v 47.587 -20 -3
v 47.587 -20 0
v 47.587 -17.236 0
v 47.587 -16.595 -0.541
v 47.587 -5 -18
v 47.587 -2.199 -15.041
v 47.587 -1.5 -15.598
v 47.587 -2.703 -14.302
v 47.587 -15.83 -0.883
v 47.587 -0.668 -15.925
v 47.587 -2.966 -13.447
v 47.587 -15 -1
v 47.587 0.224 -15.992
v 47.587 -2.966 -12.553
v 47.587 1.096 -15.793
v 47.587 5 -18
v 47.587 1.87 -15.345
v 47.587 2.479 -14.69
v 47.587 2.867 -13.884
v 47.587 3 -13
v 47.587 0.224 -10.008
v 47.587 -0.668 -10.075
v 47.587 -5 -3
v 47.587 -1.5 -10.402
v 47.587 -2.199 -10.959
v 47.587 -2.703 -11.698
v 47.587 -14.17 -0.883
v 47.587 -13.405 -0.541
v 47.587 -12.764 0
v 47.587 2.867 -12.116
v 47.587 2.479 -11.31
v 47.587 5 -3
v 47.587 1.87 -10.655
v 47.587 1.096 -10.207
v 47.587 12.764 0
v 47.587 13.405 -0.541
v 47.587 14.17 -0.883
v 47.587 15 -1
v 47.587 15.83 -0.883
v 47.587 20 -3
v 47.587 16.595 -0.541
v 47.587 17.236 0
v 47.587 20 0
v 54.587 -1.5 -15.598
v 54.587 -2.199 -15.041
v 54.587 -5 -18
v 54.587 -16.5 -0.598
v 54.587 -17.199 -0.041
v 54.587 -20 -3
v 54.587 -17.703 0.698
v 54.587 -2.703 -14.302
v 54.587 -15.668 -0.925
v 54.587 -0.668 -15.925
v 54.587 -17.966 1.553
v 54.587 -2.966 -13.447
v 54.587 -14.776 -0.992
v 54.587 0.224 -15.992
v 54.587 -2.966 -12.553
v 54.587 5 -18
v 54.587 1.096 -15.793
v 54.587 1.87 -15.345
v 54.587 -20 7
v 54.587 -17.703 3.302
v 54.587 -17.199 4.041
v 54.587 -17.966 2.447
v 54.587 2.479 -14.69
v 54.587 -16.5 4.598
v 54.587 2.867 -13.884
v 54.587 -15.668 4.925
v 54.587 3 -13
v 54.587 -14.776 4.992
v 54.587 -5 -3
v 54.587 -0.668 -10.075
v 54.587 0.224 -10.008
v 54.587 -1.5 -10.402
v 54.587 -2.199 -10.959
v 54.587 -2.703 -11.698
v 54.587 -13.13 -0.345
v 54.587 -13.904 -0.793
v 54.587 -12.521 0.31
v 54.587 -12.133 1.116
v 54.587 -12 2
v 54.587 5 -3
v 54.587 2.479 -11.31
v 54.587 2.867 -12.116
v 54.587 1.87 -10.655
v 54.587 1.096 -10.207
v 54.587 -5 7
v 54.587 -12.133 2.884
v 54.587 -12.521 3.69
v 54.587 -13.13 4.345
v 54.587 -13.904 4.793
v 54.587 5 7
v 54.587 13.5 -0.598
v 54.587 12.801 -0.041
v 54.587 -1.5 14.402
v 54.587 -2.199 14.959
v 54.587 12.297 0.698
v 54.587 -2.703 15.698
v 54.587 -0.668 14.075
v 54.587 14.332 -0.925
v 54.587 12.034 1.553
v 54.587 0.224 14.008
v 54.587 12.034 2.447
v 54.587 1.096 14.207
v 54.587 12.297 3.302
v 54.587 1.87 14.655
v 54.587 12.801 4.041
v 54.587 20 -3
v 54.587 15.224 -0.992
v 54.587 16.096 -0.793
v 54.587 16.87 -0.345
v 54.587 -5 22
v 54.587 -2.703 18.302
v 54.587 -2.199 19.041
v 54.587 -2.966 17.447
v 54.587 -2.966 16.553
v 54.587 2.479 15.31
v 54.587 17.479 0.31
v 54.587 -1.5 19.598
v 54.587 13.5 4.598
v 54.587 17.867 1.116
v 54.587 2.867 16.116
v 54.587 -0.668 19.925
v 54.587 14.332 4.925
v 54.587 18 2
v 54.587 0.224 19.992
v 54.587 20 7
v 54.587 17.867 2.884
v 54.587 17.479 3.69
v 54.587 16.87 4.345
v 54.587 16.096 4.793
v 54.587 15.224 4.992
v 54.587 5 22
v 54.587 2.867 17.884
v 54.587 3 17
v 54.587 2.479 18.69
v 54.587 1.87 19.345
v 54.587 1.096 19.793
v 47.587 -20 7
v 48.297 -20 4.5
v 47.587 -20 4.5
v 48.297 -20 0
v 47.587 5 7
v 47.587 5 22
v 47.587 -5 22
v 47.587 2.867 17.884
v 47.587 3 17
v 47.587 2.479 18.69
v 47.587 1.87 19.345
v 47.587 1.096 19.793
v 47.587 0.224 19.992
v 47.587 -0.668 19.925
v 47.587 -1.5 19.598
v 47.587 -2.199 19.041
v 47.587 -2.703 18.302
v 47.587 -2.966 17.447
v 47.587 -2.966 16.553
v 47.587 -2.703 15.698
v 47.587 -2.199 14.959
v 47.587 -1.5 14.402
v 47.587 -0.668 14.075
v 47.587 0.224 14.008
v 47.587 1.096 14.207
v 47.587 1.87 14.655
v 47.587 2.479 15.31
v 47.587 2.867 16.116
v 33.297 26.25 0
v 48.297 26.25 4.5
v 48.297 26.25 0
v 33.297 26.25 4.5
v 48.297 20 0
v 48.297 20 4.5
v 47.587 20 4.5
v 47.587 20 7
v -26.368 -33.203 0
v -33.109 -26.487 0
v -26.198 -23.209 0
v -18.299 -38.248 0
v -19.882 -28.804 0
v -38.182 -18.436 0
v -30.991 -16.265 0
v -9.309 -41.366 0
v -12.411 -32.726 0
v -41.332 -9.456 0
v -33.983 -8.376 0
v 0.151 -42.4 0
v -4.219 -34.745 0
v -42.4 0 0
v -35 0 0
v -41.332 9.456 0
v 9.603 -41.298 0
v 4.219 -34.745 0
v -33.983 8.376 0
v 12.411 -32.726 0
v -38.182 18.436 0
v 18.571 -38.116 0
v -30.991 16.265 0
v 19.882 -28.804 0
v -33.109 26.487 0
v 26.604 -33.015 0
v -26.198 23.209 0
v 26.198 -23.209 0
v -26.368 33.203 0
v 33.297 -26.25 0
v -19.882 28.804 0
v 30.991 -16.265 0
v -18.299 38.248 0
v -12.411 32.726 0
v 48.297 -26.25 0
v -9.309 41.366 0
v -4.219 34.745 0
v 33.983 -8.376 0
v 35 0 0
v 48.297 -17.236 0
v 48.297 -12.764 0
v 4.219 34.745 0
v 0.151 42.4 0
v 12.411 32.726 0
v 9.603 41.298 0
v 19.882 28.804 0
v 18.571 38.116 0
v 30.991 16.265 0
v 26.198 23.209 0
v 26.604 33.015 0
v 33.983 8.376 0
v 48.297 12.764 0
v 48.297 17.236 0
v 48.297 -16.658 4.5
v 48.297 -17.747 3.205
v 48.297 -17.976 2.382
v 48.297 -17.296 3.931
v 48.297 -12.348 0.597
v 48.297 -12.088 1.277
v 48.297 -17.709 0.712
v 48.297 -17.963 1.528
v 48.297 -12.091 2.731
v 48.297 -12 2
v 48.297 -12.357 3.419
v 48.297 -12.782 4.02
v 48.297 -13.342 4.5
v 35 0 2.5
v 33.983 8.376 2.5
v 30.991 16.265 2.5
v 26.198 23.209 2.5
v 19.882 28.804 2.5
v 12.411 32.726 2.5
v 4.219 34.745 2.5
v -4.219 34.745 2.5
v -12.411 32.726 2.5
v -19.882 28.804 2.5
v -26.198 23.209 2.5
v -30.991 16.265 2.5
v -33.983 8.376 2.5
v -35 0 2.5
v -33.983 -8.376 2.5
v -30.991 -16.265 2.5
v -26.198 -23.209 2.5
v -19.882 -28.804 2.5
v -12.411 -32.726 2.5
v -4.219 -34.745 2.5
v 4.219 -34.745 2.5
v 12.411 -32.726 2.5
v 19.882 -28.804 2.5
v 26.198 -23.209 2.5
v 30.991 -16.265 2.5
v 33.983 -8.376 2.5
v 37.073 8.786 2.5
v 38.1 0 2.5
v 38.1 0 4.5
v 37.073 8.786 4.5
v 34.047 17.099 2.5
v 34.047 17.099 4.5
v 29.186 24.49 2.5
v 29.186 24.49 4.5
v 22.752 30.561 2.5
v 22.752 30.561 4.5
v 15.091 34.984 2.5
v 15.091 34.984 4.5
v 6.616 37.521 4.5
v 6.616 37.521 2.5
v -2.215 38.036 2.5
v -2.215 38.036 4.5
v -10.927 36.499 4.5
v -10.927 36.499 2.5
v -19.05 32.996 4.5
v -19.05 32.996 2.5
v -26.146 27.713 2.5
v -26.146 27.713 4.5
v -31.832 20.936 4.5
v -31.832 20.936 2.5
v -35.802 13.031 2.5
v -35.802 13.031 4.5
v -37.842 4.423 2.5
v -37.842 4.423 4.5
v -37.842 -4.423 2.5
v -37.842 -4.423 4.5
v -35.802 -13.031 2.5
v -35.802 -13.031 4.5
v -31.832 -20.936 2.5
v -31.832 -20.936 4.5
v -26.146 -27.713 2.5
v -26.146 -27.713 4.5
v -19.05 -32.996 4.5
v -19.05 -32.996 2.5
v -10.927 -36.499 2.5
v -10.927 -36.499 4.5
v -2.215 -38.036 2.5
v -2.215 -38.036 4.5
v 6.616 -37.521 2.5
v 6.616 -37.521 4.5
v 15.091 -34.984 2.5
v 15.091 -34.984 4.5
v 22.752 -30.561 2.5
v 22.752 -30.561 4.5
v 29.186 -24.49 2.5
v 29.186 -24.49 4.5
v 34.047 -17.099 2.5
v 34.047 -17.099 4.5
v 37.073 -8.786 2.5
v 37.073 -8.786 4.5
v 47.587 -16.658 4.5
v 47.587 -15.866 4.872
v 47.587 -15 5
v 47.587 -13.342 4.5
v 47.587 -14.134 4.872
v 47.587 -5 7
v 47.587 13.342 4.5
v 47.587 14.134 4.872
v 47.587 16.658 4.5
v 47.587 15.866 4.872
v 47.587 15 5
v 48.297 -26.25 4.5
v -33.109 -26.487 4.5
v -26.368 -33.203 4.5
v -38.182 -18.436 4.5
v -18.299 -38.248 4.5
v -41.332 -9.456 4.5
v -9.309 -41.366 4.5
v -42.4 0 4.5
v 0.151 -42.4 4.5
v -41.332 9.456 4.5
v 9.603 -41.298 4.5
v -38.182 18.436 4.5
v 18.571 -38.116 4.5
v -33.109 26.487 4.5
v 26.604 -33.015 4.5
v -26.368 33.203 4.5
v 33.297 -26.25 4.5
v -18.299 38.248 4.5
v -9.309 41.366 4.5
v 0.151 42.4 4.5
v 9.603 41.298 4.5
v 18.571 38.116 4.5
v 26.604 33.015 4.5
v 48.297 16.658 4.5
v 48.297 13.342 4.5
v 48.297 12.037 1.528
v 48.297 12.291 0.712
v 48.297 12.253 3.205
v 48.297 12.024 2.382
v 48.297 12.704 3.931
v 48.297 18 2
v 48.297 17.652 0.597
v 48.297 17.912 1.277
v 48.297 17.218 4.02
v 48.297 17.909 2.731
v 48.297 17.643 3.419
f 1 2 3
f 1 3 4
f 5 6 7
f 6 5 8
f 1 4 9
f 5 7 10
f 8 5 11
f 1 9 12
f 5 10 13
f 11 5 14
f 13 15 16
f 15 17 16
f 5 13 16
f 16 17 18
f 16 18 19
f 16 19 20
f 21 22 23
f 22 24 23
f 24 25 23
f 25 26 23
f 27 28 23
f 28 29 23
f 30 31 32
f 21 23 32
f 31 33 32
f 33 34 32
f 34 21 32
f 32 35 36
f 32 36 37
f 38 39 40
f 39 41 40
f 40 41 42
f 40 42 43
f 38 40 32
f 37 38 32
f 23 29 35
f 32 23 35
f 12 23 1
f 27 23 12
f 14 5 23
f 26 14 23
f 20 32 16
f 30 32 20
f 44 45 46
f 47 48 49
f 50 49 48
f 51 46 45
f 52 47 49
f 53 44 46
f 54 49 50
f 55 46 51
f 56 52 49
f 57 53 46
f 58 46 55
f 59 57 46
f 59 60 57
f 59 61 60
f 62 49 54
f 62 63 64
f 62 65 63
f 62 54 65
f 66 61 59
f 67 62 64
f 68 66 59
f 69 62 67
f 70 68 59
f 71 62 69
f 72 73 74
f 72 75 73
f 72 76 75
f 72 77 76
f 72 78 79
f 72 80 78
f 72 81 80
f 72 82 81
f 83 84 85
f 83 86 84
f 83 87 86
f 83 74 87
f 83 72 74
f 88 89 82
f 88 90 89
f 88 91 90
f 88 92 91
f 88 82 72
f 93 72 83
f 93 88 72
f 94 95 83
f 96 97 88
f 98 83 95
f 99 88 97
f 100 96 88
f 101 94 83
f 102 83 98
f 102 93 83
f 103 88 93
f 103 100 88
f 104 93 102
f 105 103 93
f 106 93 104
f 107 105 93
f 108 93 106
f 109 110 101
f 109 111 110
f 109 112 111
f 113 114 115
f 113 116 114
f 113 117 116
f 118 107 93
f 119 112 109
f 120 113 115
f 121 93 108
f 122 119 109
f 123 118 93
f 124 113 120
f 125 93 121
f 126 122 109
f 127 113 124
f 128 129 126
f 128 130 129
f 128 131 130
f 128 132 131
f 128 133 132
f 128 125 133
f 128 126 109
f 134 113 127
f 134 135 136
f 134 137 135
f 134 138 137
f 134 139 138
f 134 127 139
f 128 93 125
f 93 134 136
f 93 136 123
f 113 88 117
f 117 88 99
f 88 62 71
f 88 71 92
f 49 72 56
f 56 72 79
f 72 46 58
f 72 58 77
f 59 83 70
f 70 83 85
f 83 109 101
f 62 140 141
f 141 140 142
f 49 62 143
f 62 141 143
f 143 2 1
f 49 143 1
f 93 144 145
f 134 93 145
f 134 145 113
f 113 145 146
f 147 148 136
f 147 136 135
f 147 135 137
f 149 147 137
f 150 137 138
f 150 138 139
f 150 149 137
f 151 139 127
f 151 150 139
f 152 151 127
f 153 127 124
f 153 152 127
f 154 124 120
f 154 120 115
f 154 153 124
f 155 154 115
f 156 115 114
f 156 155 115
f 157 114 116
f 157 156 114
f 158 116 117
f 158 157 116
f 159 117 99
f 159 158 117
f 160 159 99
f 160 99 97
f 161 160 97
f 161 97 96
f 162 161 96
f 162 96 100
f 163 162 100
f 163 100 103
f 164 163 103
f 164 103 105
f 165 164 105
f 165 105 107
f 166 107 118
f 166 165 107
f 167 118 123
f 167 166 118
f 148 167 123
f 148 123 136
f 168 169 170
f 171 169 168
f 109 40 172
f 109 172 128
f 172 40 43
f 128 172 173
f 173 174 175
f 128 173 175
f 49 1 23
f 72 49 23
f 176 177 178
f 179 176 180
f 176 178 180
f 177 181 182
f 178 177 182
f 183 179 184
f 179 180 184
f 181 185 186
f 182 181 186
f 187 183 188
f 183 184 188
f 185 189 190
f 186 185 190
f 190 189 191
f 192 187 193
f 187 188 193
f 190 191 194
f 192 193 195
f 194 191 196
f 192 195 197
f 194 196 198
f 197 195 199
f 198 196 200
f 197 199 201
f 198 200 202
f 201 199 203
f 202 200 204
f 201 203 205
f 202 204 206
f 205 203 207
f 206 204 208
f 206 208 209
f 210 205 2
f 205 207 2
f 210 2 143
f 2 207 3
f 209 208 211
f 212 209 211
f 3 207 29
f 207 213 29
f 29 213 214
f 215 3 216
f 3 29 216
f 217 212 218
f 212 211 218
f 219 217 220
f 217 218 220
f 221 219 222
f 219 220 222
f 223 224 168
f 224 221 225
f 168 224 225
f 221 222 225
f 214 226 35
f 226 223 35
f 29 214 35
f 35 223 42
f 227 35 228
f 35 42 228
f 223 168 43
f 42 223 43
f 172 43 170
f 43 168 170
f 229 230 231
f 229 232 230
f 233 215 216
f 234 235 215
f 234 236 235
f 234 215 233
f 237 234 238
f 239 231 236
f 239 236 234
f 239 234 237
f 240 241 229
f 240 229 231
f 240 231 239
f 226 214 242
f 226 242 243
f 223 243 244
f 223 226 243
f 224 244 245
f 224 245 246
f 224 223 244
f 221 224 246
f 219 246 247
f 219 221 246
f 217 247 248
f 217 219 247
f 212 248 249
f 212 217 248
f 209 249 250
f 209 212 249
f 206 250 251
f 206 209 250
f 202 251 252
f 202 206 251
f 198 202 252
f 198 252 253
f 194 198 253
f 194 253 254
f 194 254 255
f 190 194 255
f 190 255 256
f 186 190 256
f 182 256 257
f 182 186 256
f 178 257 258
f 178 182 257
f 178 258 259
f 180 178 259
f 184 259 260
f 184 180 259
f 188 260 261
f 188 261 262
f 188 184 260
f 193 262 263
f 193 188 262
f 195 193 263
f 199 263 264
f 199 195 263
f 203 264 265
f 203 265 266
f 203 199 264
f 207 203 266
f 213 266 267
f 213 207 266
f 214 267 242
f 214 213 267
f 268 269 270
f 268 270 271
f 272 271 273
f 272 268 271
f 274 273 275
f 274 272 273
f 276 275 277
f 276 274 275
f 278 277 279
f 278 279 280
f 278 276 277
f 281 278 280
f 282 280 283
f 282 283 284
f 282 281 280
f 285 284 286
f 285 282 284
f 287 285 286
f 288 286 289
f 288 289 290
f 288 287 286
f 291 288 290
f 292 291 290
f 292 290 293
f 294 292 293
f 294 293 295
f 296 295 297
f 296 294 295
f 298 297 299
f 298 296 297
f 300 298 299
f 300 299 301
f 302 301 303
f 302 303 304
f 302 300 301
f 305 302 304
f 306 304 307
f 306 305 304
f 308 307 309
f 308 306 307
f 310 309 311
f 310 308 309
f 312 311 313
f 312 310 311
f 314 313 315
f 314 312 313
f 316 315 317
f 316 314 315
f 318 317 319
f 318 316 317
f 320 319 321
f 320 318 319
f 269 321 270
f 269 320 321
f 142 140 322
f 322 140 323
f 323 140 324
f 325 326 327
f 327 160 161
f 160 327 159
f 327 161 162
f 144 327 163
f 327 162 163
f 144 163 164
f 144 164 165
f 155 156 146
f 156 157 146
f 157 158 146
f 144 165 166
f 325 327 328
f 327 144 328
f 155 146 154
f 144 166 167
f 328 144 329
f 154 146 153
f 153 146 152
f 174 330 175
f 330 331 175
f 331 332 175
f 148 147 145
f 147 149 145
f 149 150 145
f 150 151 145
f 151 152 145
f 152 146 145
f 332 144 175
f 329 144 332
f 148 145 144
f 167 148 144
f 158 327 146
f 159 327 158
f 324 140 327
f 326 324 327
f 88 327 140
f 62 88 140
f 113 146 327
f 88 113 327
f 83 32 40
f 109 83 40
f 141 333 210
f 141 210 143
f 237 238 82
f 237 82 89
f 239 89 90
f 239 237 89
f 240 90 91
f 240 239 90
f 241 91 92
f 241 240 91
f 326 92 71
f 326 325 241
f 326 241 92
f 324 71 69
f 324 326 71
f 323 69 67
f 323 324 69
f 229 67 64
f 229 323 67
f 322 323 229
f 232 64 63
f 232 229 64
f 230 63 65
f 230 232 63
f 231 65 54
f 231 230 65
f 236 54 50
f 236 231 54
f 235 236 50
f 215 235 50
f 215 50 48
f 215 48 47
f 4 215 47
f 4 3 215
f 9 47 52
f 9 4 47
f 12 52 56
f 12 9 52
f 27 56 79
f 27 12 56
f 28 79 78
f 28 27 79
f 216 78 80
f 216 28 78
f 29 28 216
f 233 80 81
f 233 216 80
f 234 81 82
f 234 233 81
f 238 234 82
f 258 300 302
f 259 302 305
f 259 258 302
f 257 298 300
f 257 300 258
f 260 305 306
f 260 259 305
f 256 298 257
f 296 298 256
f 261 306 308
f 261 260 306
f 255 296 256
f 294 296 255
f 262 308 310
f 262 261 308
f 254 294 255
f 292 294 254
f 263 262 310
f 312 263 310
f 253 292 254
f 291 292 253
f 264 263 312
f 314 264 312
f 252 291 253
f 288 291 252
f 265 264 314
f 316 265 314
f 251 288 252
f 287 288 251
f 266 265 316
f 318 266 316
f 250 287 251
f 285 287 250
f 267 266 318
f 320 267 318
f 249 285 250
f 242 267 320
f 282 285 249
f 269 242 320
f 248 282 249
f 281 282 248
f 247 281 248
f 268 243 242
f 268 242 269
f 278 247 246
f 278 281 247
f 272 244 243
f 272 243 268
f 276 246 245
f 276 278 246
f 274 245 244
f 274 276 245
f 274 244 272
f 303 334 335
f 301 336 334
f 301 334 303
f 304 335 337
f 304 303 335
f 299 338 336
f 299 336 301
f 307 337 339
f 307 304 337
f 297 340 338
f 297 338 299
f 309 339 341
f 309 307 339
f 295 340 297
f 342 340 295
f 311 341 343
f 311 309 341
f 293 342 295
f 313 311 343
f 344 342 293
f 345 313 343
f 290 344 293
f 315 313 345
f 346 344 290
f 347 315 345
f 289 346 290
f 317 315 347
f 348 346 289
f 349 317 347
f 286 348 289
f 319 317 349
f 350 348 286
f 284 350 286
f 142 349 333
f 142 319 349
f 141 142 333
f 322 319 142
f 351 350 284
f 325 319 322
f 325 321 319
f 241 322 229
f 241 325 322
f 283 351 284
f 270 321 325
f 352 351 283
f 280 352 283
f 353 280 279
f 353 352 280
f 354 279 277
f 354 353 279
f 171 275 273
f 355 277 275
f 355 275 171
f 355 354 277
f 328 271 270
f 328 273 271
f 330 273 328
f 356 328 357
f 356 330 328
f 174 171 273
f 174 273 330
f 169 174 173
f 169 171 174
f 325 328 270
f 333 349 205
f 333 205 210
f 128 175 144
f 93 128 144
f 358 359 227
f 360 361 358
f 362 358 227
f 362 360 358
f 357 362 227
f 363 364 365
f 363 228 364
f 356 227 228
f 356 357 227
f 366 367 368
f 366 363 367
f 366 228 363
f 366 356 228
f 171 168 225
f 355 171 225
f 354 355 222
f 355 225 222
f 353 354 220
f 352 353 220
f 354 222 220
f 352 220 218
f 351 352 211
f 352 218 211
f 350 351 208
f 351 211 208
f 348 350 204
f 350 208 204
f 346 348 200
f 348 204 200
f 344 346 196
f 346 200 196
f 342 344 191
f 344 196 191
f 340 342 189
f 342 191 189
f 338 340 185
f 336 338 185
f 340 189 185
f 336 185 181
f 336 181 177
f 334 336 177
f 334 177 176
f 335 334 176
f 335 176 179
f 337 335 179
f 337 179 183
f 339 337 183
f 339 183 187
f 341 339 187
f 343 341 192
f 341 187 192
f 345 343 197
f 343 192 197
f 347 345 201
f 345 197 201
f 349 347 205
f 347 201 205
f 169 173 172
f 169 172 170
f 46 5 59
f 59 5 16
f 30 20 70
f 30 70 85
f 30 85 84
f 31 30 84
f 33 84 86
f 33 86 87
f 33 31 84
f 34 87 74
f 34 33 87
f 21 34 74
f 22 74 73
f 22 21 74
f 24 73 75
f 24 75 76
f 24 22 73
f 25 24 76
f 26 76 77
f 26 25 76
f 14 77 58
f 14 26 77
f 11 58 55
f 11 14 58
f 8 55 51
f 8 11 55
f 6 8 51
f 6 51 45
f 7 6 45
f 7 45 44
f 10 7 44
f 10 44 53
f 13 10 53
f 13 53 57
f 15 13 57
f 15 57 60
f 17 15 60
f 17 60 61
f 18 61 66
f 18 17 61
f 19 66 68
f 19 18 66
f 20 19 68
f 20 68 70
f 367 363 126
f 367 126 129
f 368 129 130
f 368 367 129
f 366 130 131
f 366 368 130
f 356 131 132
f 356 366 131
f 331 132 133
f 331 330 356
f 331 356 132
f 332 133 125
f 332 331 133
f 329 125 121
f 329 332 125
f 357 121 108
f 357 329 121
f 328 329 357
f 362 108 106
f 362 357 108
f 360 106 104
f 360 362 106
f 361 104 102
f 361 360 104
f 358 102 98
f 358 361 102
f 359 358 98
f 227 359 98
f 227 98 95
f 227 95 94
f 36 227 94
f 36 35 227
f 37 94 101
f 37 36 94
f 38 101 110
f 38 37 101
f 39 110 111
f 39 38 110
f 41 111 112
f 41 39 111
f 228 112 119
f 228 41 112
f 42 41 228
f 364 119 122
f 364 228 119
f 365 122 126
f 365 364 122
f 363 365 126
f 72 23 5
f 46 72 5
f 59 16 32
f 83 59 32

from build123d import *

# Parameters (mm, degrees)
F0_R     = 42.4
F0_R_2   = 35
F1_DEPTH = 2.5
F2_R     = 42.4
F2_R_2   = 38.1
F3_DEPTH = 2
F7_DEPTH = 4.5
F8_START = 3.2
F5_R     = 3
F8_DEPTH = 7


with BuildPart() as f1:
    # F0 (on Top) → F1 (new body)
    with BuildSketch(Plane.XY):
        Circle(F0_R)
        Circle(F0_R_2, mode=Mode.SUBTRACT)
    extrude(amount=F1_DEPTH)

    # F2 (on face) → F3 (join)
    with BuildSketch(Plane.XY.offset(2.5)):
        Circle(F2_R)
        Circle(F2_R_2, mode=Mode.SUBTRACT)
    extrude(amount=F3_DEPTH)

    # F6 (on face) → F7 (join)
    with BuildSketch(Plane.XY.offset(4.5)):
        with BuildLine():
            Line((48.2971094842, -26.25), (48.2971094842, 26.25))
            Line((48.2971094842, 26.25), (33.2971094842, 26.25))
            ThreePointArc((33.2971094842, 26.25), (42.4, 0), (33.2971094842, -26.25))
            Line((33.2971094842, -26.25), (48.2971094842, -26.25))
        make_face()
    extrude(amount=-F7_DEPTH)

    # F5 (on offset) → F8 (join)
    with BuildSketch(Plane.YZ.offset(44.38663).offset(F8_START)):
        Polygon((20, -3), (20, 7), (5, 7), (5, 22), (-5, 22), (-5, 7), (-20, 7), (-20, -3), (-5, -3), (-5, -18), (5, -18), (5, -3), align=None)
        with Locations((0, -13)):
            Circle(F5_R, mode=Mode.SUBTRACT)
        with Locations((-15, 2)):
            Circle(F5_R, mode=Mode.SUBTRACT)
        with Locations((15, 2)):
            Circle(F5_R, mode=Mode.SUBTRACT)
        with Locations((0, 17)):
            Circle(F5_R, mode=Mode.SUBTRACT)
    extrude(amount=F8_DEPTH)


solid = f1.part
